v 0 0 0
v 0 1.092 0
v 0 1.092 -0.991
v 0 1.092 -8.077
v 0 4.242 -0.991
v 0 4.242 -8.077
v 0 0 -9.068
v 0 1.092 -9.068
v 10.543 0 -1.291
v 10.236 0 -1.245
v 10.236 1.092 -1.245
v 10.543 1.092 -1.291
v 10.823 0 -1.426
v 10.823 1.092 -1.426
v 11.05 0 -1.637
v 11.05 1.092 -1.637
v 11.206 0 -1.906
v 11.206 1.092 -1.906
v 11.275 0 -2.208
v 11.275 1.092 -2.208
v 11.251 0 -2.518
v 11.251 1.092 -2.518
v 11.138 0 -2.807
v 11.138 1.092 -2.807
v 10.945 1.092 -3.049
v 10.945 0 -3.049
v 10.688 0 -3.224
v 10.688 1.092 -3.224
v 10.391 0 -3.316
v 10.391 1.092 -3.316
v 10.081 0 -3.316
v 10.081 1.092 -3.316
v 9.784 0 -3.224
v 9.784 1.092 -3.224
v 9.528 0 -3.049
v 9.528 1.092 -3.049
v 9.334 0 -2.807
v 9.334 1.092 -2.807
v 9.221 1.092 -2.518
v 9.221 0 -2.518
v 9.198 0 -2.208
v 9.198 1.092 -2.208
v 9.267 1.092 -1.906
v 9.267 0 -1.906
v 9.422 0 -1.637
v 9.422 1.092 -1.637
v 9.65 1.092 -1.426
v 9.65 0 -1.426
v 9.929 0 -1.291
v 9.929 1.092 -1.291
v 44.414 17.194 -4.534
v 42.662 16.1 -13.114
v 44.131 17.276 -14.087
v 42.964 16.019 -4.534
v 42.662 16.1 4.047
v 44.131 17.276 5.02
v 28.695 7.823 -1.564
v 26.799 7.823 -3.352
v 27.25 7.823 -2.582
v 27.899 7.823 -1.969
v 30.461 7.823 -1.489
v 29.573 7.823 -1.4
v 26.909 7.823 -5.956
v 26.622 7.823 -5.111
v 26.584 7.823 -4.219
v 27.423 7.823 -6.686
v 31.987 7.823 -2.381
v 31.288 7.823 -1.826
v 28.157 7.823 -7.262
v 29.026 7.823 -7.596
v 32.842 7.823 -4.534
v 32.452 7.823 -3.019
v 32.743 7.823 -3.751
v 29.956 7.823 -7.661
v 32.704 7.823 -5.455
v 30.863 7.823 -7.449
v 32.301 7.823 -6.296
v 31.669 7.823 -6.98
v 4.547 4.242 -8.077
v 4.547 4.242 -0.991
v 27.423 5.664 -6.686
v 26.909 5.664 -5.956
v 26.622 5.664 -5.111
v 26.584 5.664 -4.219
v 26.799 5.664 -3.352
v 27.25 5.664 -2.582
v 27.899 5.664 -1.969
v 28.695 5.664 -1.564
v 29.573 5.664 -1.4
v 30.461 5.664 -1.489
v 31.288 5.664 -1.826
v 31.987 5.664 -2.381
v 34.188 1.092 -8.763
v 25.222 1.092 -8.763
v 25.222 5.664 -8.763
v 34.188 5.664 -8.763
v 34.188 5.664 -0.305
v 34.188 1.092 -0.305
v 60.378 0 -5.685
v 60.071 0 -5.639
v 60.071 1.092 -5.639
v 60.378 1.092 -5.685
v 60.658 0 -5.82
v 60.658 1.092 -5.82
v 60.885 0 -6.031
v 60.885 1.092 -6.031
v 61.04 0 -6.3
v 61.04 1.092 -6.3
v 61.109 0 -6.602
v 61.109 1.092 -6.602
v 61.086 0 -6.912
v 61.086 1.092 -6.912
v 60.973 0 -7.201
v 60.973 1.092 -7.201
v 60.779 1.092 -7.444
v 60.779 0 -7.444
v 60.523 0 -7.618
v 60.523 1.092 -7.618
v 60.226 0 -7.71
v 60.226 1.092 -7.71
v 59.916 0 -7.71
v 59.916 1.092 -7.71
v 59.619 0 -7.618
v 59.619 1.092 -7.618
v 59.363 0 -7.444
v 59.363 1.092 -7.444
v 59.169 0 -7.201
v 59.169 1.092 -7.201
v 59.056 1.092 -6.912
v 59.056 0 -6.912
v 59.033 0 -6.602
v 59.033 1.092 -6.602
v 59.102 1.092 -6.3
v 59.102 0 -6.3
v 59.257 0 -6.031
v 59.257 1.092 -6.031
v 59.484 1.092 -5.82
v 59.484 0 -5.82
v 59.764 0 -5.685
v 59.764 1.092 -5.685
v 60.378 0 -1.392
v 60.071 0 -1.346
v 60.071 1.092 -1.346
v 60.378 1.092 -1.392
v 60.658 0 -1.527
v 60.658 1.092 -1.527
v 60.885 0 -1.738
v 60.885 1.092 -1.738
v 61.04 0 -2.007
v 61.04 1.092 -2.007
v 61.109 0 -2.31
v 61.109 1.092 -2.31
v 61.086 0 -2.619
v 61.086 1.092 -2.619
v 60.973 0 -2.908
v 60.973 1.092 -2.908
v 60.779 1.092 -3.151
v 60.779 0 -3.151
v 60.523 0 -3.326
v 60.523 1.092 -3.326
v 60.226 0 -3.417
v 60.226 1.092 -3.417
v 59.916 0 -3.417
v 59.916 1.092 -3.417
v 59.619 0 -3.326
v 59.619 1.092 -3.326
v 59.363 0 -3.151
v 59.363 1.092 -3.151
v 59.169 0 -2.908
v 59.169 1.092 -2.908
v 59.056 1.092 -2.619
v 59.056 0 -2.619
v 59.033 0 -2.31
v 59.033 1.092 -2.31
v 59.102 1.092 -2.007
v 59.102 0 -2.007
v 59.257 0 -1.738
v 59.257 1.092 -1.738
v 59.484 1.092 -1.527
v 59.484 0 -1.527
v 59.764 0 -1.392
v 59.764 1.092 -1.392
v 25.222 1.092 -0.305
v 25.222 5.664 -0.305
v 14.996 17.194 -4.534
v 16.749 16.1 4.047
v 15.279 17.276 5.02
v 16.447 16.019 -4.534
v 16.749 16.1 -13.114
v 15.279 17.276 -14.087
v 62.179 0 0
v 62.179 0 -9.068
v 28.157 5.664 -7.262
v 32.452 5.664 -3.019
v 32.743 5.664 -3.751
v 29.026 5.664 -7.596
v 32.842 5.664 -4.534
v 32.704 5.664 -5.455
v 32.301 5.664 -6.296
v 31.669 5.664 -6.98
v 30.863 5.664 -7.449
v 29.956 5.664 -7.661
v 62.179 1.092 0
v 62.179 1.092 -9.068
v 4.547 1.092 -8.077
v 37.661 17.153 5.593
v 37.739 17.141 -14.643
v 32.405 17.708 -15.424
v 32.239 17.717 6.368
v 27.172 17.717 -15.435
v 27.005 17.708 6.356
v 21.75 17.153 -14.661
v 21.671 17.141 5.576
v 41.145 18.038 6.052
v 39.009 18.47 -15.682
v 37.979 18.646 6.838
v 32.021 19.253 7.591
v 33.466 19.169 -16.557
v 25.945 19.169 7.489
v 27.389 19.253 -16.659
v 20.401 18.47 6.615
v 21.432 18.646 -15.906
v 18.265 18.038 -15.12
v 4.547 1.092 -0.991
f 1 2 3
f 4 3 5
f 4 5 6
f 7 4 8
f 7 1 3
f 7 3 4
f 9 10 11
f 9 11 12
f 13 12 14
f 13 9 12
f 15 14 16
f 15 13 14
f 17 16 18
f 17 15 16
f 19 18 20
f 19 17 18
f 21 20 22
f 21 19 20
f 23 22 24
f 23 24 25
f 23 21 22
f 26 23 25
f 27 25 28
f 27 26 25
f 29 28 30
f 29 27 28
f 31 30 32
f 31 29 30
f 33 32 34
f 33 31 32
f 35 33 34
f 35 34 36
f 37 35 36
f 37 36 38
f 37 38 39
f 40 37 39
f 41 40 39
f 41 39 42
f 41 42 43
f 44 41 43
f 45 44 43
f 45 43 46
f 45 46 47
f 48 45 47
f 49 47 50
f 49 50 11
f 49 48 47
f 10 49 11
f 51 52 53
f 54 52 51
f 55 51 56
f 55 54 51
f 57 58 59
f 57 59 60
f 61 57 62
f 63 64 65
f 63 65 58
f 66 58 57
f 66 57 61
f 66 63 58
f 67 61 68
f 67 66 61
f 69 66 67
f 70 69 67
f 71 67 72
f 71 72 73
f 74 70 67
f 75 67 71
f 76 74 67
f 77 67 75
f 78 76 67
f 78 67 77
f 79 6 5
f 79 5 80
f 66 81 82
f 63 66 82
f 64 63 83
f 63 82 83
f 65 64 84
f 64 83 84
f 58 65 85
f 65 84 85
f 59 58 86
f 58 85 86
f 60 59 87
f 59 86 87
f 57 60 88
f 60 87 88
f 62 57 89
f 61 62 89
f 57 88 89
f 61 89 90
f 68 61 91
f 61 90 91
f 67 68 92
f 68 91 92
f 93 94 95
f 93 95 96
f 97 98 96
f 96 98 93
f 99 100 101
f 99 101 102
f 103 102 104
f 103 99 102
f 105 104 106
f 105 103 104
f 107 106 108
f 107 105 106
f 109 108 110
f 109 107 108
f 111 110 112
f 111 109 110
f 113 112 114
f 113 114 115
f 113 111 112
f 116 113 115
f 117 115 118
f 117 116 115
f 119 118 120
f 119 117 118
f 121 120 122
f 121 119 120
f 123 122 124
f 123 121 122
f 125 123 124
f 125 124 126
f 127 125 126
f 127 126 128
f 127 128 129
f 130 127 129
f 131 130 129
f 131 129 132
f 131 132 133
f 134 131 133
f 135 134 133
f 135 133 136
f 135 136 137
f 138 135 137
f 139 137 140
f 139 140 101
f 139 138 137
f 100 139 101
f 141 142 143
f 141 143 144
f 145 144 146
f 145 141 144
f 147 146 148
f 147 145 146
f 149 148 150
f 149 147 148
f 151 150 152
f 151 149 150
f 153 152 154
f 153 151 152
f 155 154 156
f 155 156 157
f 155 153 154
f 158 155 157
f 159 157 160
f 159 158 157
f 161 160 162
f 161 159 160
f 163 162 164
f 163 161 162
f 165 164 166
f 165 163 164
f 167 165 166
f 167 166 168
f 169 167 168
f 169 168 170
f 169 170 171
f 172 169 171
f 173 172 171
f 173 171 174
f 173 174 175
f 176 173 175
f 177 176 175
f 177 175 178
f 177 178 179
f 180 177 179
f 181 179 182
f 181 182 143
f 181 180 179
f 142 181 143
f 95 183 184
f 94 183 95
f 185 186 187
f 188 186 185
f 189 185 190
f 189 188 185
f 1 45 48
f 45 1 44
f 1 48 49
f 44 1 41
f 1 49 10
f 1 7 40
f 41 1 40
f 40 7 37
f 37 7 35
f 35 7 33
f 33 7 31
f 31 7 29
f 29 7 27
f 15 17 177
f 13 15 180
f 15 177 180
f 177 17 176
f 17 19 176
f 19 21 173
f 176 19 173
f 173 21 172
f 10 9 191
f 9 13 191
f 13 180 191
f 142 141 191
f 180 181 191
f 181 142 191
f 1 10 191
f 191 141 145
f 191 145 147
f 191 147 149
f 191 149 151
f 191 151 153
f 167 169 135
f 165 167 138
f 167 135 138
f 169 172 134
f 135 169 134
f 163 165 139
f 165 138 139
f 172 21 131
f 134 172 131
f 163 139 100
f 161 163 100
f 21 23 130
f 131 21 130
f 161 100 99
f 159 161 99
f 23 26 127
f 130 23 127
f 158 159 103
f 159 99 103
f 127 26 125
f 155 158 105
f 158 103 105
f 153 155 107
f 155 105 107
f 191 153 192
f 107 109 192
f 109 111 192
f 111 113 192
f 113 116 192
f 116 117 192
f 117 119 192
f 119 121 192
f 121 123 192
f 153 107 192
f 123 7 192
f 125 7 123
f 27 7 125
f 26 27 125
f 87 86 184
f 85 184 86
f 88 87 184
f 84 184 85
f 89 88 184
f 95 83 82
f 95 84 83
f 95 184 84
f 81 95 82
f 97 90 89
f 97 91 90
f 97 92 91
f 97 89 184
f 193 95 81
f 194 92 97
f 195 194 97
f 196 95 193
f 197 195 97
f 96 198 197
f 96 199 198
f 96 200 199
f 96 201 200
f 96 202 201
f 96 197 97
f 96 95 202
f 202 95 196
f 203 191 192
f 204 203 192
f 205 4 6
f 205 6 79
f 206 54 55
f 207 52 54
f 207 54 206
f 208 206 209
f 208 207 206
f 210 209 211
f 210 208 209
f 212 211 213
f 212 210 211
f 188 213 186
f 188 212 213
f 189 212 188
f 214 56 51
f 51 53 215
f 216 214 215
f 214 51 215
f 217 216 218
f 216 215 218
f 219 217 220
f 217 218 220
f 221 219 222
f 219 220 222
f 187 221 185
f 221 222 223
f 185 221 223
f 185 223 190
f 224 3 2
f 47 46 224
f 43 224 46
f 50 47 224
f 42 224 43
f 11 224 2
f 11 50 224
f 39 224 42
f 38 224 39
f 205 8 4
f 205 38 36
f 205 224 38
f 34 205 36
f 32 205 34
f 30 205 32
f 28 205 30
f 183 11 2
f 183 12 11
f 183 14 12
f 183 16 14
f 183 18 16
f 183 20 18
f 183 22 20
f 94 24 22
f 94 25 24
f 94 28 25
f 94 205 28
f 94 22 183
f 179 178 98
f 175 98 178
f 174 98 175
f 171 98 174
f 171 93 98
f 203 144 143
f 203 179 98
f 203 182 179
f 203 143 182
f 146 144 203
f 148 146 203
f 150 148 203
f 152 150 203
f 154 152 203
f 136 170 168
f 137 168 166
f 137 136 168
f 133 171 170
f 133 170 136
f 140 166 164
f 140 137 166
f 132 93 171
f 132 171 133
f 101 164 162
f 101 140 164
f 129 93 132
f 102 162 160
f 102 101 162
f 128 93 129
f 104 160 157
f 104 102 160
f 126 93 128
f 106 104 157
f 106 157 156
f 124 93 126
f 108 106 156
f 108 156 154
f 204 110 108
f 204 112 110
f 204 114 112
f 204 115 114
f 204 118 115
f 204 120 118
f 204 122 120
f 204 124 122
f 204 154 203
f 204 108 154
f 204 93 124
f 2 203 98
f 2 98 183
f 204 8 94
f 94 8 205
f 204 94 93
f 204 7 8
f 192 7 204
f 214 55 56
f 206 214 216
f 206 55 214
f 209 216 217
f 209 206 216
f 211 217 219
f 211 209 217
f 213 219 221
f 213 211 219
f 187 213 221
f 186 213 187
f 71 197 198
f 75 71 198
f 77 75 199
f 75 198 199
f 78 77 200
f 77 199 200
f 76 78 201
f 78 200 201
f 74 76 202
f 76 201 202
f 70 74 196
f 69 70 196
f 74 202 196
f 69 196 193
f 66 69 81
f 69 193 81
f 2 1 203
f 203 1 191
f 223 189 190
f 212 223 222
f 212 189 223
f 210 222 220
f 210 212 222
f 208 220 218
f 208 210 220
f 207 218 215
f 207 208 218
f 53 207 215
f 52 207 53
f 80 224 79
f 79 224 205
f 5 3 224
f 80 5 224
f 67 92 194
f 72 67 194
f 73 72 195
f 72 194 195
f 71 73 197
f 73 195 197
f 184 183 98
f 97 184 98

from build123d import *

# Parameters (mm, degrees)
SKETCH1_W                = 62.1792
SKETCH1_H                = 9.0678
SKETCH1_R                = 1.0414
BOSS_EXTRUDE1_DEPTH      = 1.0922
SKETCH2_W                = 4.5466
SKETCH2_H                = 7.0866
BOSS_EXTRUDE2_DEPTH      = 3.1496
SKETCH3_W                = 8.9662
SKETCH3_H                = 8.4582
BOSS_EXTRUDE3_DEPTH      = 4.572
BOSS_EXTRUDE4_DEPTH      = 2.159
BOSS_EXTRUDE5_DEPTH      = 50.8
BOSS_EXTRUDE5_DEPTH_BACK = 50.8
SKETCH11_R               = 52.324
SKETCH11_R_2             = 50.8


with BuildPart() as part:
    # Sketch1 → Boss-Extrude1 (new body)
    with BuildSketch(Plane(origin=(0, 0, 0), x_dir=(1, 0, 0), z_dir=(0, 1, 0))):
        with Locations((31.0896, 4.5339)):
            Rectangle(SKETCH1_W, SKETCH1_H)
        with Locations(Location((10.2362, 2.286, 0), (0, 0, 270))):
            Circle(SKETCH1_R, mode=Mode.SUBTRACT)
        with Locations(Location((60.071, 6.6802, 0), (0, 0, 270))):
            Circle(SKETCH1_R, mode=Mode.SUBTRACT)
        with Locations(Location((60.071, 2.3876, 0), (0, 0, 270))):
            Circle(SKETCH1_R, mode=Mode.SUBTRACT)
    extrude(amount=BOSS_EXTRUDE1_DEPTH)

    # Sketch2 → Boss-Extrude2 (add)
    with BuildSketch(Plane(origin=(0, 1.0922, 0), x_dir=(1, 0, 0), z_dir=(0, 1, 0))):
        with Locations((2.2733, 4.5339)):
            Rectangle(SKETCH2_W, SKETCH2_H)
    extrude(amount=BOSS_EXTRUDE2_DEPTH)

    # Sketch3 → Boss-Extrude3 (add)
    with BuildSketch(Plane(origin=(0, 1.0922, 0), x_dir=(1, 0, 0), z_dir=(0, 1, 0))):
        with Locations((29.7053, 4.5339)):
            Rectangle(SKETCH3_W, SKETCH3_H)
    extrude(amount=BOSS_EXTRUDE3_DEPTH)

    # Sketch4 → Boss-Extrude4 (add)
    with BuildSketch(Plane(origin=(0, 5.6642, 0), x_dir=(1, 0, 0), z_dir=(0, 1, 0))):
        with BuildLine():
            ThreePointArc((32.8422, 4.5339), (30.863379034, 7.449203511), (27.423477974, 6.686440325))
            Line((27.423477974, 6.686440325), (31.987122026, 2.381359675))
            ThreePointArc((31.987122026, 2.381359675), (32.620603511, 3.375820966), (32.8422, 4.5339))
        make_face()
        with BuildLine():
            Line((31.987122026, 2.381359675), (27.423477974, 6.686440325))
            ThreePointArc((27.423477974, 6.686440325), (27.552759675, 2.252077974), (31.987122026, 2.381359675))
        make_face()
    extrude(amount=BOSS_EXTRUDE4_DEPTH)


with BuildPart() as body_2:
    # Loft1: read off the stored shape, not the designer's step
    # Loft1: loft between two sections, ruled curve by curve
    loft1_from = [
        Edge.make_bspline([(-17.815038703, 43.7642, -36.004399795), (-13.855010478, 43.7642, -36.004399795), (-9.894982253, 43.7642, -36.004399795), (-1.974925802, 43.7642, -36.004399795), (1.985102423, 43.7642, -36.004399795), (9.905158874, 43.7642, -36.004399795), (13.865187099, 43.7642, -36.004399795), (21.785243549, 43.7642, -36.004399795), (25.745271775, 43.7642, -36.004399795), (33.665328225, 43.7642, -36.004399795), (37.625356451, 43.7642, -36.004399795), (45.545412901, 43.7642, -36.004399795), (49.505441126, 43.7642, -36.004399795), (57.425497577, 43.7642, -36.004399795), (61.385525802, 43.7642, -36.004399795), (69.305582253, 43.7642, -36.004399795), (73.265610478, 43.7642, -36.004399795), (77.225638703, 43.7642, -36.004399795)], [0, 0, 0, 0, 0.125, 0.125, 0.25, 0.25, 0.375, 0.375, 0.5, 0.5, 0.625, 0.625, 0.75, 0.75, 0.875, 0.875, 1, 1, 1, 1], 3),
        Edge.make_bspline([(77.225638703, 43.7642, -36.004399795), (77.225638703, 43.7642, -30.759316496), (77.225638703, 43.7642, -25.514233197), (77.225638703, 43.7642, -15.024066598), (77.225638703, 43.7642, -9.778983299), (77.225638703, 43.7642, 0.711183299), (77.225638703, 43.7642, 5.956266598), (77.225638703, 43.7642, 16.446433197), (77.225638703, 43.7642, 21.691516496), (77.225638703, 43.7642, 26.936599795)], [0, 0, 0, 0, 0.25, 0.25, 0.5, 0.5, 0.75, 0.75, 1, 1, 1, 1], 3),
        Edge.make_bspline([(-17.815038703, 43.7642, 26.936599795), (-17.815038703, 43.7642, 21.691516496), (-17.815038703, 43.7642, 16.446433197), (-17.815038703, 43.7642, 5.956266598), (-17.815038703, 43.7642, 0.711183299), (-17.815038703, 43.7642, -9.778983299), (-17.815038703, 43.7642, -15.024066598), (-17.815038703, 43.7642, -25.514233197), (-17.815038703, 43.7642, -30.759316496), (-17.815038703, 43.7642, -36.004399795)], [0, 0, 0, 0, 0.25, 0.25, 0.5, 0.5, 0.75, 0.75, 1, 1, 1, 1], 3),
        Edge.make_bspline([(77.225638703, 43.7642, 26.936599795), (73.265610478, 43.7642, 26.936599795), (69.305582253, 43.7642, 26.936599795), (61.385525802, 43.7642, 26.936599795), (57.425497577, 43.7642, 26.936599795), (49.505441126, 43.7642, 26.936599795), (45.545412901, 43.7642, 26.936599795), (37.625356451, 43.7642, 26.936599795), (33.665328225, 43.7642, 26.936599795), (25.745271775, 43.7642, 26.936599795), (21.785243549, 43.7642, 26.936599795), (13.865187099, 43.7642, 26.936599795), (9.905158874, 43.7642, 26.936599795), (1.985102423, 43.7642, 26.936599795), (-1.974925802, 43.7642, 26.936599795), (-9.894982253, 43.7642, 26.936599795), (-13.855010478, 43.7642, 26.936599795), (-17.815038703, 43.7642, 26.936599795)], [0, 0, 0, 0, 0.125, 0.125, 0.25, 0.25, 0.375, 0.375, 0.5, 0.5, 0.625, 0.625, 0.75, 0.75, 0.875, 0.875, 1, 1, 1, 1], 3),
    ]
    loft1_to = [
        Edge.make_bspline([(27.089926276, 7.8232, -6.265939807), (27.210266192, 7.8232, -6.447652637), (27.356593228, 7.8232, -6.627246031), (27.704874025, 7.8232, -6.962236266), (27.906975354, 7.8232, -7.117459947), (28.360359335, 7.8232, -7.379930242), (28.611638214, 7.8232, -7.486888917), (29.143809422, 7.8232, -7.63244288), (29.424466589, 7.8232, -7.6708), (29.986133411, 7.8232, -7.6708), (30.266790578, 7.8232, -7.63244288), (30.798961786, 7.8232, -7.486888917), (31.050240665, 7.8232, -7.379930242), (31.503624646, 7.8232, -7.117459947), (31.705725975, 7.8232, -6.962236266), (32.054006772, 7.8232, -6.627246031), (32.200333808, 7.8232, -6.447652637), (32.320673724, 7.8232, -6.265939807)], [0, 0, 0, 0, 0.125, 0.125, 0.25, 0.25, 0.375, 0.375, 0.5, 0.5, 0.625, 0.625, 0.75, 0.75, 0.875, 0.875, 1, 1, 1, 1], 3),
        Edge.make_bspline([(32.320673724, 7.8232, -6.265939807), (32.480064731, 7.8232, -6.025259974), (32.612503267, 7.8232, -5.751723137), (32.793795146, 7.8232, -5.163282045), (32.8422, 7.8232, -4.848745684), (32.8422, 7.8232, -4.219054316), (32.793795146, 7.8232, -3.904517955), (32.612503267, 7.8232, -3.316076863), (32.480064731, 7.8232, -3.042540026), (32.320673724, 7.8232, -2.801860193)], [0, 0, 0, 0, 0.25, 0.25, 0.5, 0.5, 0.75, 0.75, 1, 1, 1, 1], 3),
        Edge.make_bspline([(27.089926276, 7.8232, -2.801860193), (26.930535269, 7.8232, -3.042540026), (26.798096733, 7.8232, -3.316076863), (26.616804854, 7.8232, -3.904517955), (26.5684, 7.8232, -4.219054316), (26.5684, 7.8232, -4.848745684), (26.616804854, 7.8232, -5.163282045), (26.798096733, 7.8232, -5.751723137), (26.930535269, 7.8232, -6.025259974), (27.089926276, 7.8232, -6.265939807)], [0, 0, 0, 0, 0.25, 0.25, 0.5, 0.5, 0.75, 0.75, 1, 1, 1, 1], 3),
        Edge.make_bspline([(32.320673724, 7.8232, -2.801860193), (32.200333808, 7.8232, -2.620147363), (32.054006772, 7.8232, -2.440553969), (31.705725975, 7.8232, -2.105563734), (31.503624646, 7.8232, -1.950340053), (31.050240665, 7.8232, -1.687869758), (30.798961786, 7.8232, -1.580911083), (30.266790578, 7.8232, -1.43535712), (29.986133411, 7.8232, -1.397), (29.424466589, 7.8232, -1.397), (29.143809422, 7.8232, -1.43535712), (28.611638214, 7.8232, -1.580911083), (28.360359335, 7.8232, -1.687869758), (27.906975354, 7.8232, -1.950340053), (27.704874025, 7.8232, -2.105563734), (27.356593228, 7.8232, -2.440553969), (27.210266192, 7.8232, -2.620147363), (27.089926276, 7.8232, -2.801860193)], [0, 0, 0, 0, 0.125, 0.125, 0.25, 0.25, 0.375, 0.375, 0.5, 0.5, 0.625, 0.625, 0.75, 0.75, 0.875, 0.875, 1, 1, 1, 1], 3),
    ]
    loft1 = Solid(Shell([*[Face.make_surface_from_curves(loft1_from[k], loft1_to[k]) for k in range(4)], Face(Wire(loft1_from)), Face(Wire(loft1_to))]))
    add(loft1)


with BuildPart() as body_3:
    # Sketch11 → Boss-Extrude5 (new, two sides: drawn at the far end of the back side and taken through both)
    with BuildSketch(Plane.XY.offset(-4.5339).offset(-BOSS_EXTRUDE5_DEPTH_BACK)):
        with Locations((29.7053, -33.02)):
            Circle(SKETCH11_R)
        with Locations((29.7053, -33.02)):
            Circle(SKETCH11_R_2, mode=Mode.SUBTRACT)
    extrude(amount=BOSS_EXTRUDE5_DEPTH + BOSS_EXTRUDE5_DEPTH_BACK)


with BuildPart() as body_2_1:
    add(body_2.part)

    # Combine1: intersect body 3
    add(body_3.part, mode=Mode.INTERSECT)


solid = Compound([part.part, body_2_1.part])
